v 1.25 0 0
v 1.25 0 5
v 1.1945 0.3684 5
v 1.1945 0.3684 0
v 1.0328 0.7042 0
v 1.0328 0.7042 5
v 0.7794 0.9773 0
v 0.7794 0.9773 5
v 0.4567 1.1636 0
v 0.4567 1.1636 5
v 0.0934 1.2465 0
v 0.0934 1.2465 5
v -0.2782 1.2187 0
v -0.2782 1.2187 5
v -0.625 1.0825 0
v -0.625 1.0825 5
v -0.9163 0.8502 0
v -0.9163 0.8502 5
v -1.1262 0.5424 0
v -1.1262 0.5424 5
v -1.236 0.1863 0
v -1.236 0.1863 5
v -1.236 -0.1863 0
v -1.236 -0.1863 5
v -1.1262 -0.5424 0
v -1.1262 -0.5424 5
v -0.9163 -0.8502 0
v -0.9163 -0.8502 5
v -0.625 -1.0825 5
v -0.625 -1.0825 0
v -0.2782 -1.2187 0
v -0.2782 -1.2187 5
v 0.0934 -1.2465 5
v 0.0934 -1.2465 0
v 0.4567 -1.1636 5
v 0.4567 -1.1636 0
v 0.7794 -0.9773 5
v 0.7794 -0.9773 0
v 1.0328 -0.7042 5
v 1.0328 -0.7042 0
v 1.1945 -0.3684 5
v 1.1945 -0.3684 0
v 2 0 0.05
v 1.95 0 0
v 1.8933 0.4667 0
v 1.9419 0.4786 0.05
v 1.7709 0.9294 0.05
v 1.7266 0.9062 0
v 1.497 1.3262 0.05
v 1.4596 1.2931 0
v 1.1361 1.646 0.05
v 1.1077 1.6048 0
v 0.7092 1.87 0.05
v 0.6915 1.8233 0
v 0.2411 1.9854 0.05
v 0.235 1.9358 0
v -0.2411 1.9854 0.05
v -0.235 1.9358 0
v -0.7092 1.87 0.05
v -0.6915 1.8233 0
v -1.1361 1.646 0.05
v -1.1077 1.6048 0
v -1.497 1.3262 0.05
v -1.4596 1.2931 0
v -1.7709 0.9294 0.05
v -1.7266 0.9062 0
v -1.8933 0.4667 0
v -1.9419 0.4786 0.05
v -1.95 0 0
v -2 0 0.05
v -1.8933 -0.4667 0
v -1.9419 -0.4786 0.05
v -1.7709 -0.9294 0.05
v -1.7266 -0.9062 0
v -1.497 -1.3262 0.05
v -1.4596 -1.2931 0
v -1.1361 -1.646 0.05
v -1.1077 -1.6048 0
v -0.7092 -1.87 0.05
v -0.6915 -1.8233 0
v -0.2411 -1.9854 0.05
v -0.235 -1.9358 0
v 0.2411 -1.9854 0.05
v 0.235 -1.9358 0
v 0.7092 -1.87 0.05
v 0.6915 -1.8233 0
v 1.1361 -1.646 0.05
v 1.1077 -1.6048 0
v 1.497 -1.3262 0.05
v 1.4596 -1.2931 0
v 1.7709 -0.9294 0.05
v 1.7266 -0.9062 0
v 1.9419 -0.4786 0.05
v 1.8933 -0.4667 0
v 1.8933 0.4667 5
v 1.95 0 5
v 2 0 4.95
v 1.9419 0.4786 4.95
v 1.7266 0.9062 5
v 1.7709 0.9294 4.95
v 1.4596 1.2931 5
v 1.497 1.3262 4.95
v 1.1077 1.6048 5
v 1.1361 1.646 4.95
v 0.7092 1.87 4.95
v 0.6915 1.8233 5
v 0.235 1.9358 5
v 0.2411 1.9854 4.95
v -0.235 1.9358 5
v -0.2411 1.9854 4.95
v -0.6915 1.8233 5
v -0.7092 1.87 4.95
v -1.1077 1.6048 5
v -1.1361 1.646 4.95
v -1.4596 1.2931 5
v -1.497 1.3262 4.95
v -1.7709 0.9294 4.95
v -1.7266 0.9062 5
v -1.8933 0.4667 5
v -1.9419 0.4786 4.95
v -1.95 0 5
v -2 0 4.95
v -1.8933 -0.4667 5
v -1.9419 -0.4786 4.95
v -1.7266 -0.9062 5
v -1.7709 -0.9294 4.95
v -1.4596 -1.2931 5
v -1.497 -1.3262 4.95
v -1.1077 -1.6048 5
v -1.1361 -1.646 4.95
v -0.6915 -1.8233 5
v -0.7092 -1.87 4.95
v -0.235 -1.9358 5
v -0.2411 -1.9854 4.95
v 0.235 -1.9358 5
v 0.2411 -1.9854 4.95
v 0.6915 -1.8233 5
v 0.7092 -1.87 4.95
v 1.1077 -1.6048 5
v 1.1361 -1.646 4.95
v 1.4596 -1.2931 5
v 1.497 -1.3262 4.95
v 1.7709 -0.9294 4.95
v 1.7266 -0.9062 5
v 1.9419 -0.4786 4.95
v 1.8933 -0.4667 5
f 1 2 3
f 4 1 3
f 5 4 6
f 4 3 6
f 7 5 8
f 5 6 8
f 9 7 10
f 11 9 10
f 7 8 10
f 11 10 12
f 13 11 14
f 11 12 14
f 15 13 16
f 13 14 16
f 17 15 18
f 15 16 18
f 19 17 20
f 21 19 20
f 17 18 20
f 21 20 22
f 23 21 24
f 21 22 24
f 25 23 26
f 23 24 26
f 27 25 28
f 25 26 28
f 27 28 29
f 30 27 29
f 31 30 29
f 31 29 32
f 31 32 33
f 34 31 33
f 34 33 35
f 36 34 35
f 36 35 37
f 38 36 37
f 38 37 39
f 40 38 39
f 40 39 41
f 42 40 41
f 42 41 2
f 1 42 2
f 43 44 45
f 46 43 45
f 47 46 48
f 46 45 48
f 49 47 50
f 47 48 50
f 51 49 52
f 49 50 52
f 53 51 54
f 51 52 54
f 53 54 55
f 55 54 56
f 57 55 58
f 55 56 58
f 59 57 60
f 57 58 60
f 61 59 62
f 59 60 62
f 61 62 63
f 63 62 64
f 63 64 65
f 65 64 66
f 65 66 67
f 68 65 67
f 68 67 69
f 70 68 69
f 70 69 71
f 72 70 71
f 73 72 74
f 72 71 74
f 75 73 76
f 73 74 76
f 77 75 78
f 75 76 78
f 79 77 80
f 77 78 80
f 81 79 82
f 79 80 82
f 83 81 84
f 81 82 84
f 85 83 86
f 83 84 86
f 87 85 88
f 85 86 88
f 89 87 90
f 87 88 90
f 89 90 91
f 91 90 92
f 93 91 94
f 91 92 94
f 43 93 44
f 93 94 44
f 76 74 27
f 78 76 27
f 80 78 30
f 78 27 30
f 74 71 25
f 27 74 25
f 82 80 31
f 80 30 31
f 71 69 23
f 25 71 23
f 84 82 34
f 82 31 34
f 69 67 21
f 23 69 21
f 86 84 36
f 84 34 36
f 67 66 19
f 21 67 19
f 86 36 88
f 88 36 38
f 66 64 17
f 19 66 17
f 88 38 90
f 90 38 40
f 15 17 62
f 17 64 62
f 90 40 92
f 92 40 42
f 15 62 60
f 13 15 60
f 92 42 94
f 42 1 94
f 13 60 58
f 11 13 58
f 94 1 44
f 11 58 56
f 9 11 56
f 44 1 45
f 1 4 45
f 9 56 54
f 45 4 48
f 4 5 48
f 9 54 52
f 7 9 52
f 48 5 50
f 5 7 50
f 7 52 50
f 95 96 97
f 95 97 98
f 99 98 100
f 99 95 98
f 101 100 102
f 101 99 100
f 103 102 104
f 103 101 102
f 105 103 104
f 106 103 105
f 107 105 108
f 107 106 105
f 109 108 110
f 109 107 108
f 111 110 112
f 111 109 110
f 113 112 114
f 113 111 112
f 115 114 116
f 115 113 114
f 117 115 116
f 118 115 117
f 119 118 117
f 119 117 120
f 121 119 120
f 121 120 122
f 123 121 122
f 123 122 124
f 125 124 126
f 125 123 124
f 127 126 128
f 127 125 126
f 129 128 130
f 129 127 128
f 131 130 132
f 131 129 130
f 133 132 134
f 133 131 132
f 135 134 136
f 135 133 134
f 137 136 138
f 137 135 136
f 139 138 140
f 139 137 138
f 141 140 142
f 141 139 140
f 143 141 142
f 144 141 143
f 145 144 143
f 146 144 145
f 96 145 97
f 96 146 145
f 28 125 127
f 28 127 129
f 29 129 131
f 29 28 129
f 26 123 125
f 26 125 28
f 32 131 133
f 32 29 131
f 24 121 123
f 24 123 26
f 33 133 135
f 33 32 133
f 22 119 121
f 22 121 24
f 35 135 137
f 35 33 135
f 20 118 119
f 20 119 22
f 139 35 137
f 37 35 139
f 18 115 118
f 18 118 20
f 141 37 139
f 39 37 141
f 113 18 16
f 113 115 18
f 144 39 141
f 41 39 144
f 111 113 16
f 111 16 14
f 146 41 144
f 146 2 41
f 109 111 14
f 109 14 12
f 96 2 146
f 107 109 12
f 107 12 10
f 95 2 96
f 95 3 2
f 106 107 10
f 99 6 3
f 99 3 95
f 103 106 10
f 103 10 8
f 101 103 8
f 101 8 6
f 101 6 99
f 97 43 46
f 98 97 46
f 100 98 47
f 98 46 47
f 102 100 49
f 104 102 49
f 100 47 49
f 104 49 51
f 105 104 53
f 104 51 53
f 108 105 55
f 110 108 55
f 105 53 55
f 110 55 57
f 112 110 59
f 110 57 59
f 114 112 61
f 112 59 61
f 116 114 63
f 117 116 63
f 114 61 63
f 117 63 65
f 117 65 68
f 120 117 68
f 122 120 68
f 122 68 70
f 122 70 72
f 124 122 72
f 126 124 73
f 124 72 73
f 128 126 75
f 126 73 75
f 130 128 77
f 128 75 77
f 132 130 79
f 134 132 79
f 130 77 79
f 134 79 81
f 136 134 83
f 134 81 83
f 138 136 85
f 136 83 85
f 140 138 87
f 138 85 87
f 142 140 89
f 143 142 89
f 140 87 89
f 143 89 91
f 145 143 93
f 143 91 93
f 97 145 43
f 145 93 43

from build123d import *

# Parameters (mm, degrees)
ESQUISSE1_R              = 2
ESQUISSE1_R_2            = 1.06
EXTRUSION1_DEPTH         = 5
CHANFREIN1_SIZE          = 0.05
SUPPRIMERFACE1_OUTLINE_R = 1.06
SUPPRIMERFACE1_DEPTH     = 5
TROU_TARAUD_M31_D        = 2.5


# Read off the part's stored shape, not the designer's step: SupprimerFace1
with BuildPart() as part:
    # Esquisse1 → Extrusion1 (new body)
    with BuildSketch(Plane.XY):
        Circle(ESQUISSE1_R)
        Circle(ESQUISSE1_R_2, mode=Mode.SUBTRACT)
    extrude(amount=EXTRUSION1_DEPTH)

    # Chanfrein1
    chanfrein1_edges = [part.edges().sort_by_distance(p)[0] for p in [
        (-2, 0, 0),
        (-2, 0, 5),
    ]]
    chamfer(chanfrein1_edges, length=CHANFREIN1_SIZE)

    # SupprimerFace1 outline → SupprimerFace1 (add)
    with BuildSketch(Plane.XY):
        Circle(SUPPRIMERFACE1_OUTLINE_R)
    extrude(amount=SUPPRIMERFACE1_DEPTH)

    # Trou taraudé M31 (through all)
    with Locations(Plane(origin=(0, 0, 0), x_dir=(-1, 0, 0), z_dir=(0, 0, -1))):
        with Locations((0, 0)):
            Hole(TROU_TARAUD_M31_D / 2)


solid = part.part
